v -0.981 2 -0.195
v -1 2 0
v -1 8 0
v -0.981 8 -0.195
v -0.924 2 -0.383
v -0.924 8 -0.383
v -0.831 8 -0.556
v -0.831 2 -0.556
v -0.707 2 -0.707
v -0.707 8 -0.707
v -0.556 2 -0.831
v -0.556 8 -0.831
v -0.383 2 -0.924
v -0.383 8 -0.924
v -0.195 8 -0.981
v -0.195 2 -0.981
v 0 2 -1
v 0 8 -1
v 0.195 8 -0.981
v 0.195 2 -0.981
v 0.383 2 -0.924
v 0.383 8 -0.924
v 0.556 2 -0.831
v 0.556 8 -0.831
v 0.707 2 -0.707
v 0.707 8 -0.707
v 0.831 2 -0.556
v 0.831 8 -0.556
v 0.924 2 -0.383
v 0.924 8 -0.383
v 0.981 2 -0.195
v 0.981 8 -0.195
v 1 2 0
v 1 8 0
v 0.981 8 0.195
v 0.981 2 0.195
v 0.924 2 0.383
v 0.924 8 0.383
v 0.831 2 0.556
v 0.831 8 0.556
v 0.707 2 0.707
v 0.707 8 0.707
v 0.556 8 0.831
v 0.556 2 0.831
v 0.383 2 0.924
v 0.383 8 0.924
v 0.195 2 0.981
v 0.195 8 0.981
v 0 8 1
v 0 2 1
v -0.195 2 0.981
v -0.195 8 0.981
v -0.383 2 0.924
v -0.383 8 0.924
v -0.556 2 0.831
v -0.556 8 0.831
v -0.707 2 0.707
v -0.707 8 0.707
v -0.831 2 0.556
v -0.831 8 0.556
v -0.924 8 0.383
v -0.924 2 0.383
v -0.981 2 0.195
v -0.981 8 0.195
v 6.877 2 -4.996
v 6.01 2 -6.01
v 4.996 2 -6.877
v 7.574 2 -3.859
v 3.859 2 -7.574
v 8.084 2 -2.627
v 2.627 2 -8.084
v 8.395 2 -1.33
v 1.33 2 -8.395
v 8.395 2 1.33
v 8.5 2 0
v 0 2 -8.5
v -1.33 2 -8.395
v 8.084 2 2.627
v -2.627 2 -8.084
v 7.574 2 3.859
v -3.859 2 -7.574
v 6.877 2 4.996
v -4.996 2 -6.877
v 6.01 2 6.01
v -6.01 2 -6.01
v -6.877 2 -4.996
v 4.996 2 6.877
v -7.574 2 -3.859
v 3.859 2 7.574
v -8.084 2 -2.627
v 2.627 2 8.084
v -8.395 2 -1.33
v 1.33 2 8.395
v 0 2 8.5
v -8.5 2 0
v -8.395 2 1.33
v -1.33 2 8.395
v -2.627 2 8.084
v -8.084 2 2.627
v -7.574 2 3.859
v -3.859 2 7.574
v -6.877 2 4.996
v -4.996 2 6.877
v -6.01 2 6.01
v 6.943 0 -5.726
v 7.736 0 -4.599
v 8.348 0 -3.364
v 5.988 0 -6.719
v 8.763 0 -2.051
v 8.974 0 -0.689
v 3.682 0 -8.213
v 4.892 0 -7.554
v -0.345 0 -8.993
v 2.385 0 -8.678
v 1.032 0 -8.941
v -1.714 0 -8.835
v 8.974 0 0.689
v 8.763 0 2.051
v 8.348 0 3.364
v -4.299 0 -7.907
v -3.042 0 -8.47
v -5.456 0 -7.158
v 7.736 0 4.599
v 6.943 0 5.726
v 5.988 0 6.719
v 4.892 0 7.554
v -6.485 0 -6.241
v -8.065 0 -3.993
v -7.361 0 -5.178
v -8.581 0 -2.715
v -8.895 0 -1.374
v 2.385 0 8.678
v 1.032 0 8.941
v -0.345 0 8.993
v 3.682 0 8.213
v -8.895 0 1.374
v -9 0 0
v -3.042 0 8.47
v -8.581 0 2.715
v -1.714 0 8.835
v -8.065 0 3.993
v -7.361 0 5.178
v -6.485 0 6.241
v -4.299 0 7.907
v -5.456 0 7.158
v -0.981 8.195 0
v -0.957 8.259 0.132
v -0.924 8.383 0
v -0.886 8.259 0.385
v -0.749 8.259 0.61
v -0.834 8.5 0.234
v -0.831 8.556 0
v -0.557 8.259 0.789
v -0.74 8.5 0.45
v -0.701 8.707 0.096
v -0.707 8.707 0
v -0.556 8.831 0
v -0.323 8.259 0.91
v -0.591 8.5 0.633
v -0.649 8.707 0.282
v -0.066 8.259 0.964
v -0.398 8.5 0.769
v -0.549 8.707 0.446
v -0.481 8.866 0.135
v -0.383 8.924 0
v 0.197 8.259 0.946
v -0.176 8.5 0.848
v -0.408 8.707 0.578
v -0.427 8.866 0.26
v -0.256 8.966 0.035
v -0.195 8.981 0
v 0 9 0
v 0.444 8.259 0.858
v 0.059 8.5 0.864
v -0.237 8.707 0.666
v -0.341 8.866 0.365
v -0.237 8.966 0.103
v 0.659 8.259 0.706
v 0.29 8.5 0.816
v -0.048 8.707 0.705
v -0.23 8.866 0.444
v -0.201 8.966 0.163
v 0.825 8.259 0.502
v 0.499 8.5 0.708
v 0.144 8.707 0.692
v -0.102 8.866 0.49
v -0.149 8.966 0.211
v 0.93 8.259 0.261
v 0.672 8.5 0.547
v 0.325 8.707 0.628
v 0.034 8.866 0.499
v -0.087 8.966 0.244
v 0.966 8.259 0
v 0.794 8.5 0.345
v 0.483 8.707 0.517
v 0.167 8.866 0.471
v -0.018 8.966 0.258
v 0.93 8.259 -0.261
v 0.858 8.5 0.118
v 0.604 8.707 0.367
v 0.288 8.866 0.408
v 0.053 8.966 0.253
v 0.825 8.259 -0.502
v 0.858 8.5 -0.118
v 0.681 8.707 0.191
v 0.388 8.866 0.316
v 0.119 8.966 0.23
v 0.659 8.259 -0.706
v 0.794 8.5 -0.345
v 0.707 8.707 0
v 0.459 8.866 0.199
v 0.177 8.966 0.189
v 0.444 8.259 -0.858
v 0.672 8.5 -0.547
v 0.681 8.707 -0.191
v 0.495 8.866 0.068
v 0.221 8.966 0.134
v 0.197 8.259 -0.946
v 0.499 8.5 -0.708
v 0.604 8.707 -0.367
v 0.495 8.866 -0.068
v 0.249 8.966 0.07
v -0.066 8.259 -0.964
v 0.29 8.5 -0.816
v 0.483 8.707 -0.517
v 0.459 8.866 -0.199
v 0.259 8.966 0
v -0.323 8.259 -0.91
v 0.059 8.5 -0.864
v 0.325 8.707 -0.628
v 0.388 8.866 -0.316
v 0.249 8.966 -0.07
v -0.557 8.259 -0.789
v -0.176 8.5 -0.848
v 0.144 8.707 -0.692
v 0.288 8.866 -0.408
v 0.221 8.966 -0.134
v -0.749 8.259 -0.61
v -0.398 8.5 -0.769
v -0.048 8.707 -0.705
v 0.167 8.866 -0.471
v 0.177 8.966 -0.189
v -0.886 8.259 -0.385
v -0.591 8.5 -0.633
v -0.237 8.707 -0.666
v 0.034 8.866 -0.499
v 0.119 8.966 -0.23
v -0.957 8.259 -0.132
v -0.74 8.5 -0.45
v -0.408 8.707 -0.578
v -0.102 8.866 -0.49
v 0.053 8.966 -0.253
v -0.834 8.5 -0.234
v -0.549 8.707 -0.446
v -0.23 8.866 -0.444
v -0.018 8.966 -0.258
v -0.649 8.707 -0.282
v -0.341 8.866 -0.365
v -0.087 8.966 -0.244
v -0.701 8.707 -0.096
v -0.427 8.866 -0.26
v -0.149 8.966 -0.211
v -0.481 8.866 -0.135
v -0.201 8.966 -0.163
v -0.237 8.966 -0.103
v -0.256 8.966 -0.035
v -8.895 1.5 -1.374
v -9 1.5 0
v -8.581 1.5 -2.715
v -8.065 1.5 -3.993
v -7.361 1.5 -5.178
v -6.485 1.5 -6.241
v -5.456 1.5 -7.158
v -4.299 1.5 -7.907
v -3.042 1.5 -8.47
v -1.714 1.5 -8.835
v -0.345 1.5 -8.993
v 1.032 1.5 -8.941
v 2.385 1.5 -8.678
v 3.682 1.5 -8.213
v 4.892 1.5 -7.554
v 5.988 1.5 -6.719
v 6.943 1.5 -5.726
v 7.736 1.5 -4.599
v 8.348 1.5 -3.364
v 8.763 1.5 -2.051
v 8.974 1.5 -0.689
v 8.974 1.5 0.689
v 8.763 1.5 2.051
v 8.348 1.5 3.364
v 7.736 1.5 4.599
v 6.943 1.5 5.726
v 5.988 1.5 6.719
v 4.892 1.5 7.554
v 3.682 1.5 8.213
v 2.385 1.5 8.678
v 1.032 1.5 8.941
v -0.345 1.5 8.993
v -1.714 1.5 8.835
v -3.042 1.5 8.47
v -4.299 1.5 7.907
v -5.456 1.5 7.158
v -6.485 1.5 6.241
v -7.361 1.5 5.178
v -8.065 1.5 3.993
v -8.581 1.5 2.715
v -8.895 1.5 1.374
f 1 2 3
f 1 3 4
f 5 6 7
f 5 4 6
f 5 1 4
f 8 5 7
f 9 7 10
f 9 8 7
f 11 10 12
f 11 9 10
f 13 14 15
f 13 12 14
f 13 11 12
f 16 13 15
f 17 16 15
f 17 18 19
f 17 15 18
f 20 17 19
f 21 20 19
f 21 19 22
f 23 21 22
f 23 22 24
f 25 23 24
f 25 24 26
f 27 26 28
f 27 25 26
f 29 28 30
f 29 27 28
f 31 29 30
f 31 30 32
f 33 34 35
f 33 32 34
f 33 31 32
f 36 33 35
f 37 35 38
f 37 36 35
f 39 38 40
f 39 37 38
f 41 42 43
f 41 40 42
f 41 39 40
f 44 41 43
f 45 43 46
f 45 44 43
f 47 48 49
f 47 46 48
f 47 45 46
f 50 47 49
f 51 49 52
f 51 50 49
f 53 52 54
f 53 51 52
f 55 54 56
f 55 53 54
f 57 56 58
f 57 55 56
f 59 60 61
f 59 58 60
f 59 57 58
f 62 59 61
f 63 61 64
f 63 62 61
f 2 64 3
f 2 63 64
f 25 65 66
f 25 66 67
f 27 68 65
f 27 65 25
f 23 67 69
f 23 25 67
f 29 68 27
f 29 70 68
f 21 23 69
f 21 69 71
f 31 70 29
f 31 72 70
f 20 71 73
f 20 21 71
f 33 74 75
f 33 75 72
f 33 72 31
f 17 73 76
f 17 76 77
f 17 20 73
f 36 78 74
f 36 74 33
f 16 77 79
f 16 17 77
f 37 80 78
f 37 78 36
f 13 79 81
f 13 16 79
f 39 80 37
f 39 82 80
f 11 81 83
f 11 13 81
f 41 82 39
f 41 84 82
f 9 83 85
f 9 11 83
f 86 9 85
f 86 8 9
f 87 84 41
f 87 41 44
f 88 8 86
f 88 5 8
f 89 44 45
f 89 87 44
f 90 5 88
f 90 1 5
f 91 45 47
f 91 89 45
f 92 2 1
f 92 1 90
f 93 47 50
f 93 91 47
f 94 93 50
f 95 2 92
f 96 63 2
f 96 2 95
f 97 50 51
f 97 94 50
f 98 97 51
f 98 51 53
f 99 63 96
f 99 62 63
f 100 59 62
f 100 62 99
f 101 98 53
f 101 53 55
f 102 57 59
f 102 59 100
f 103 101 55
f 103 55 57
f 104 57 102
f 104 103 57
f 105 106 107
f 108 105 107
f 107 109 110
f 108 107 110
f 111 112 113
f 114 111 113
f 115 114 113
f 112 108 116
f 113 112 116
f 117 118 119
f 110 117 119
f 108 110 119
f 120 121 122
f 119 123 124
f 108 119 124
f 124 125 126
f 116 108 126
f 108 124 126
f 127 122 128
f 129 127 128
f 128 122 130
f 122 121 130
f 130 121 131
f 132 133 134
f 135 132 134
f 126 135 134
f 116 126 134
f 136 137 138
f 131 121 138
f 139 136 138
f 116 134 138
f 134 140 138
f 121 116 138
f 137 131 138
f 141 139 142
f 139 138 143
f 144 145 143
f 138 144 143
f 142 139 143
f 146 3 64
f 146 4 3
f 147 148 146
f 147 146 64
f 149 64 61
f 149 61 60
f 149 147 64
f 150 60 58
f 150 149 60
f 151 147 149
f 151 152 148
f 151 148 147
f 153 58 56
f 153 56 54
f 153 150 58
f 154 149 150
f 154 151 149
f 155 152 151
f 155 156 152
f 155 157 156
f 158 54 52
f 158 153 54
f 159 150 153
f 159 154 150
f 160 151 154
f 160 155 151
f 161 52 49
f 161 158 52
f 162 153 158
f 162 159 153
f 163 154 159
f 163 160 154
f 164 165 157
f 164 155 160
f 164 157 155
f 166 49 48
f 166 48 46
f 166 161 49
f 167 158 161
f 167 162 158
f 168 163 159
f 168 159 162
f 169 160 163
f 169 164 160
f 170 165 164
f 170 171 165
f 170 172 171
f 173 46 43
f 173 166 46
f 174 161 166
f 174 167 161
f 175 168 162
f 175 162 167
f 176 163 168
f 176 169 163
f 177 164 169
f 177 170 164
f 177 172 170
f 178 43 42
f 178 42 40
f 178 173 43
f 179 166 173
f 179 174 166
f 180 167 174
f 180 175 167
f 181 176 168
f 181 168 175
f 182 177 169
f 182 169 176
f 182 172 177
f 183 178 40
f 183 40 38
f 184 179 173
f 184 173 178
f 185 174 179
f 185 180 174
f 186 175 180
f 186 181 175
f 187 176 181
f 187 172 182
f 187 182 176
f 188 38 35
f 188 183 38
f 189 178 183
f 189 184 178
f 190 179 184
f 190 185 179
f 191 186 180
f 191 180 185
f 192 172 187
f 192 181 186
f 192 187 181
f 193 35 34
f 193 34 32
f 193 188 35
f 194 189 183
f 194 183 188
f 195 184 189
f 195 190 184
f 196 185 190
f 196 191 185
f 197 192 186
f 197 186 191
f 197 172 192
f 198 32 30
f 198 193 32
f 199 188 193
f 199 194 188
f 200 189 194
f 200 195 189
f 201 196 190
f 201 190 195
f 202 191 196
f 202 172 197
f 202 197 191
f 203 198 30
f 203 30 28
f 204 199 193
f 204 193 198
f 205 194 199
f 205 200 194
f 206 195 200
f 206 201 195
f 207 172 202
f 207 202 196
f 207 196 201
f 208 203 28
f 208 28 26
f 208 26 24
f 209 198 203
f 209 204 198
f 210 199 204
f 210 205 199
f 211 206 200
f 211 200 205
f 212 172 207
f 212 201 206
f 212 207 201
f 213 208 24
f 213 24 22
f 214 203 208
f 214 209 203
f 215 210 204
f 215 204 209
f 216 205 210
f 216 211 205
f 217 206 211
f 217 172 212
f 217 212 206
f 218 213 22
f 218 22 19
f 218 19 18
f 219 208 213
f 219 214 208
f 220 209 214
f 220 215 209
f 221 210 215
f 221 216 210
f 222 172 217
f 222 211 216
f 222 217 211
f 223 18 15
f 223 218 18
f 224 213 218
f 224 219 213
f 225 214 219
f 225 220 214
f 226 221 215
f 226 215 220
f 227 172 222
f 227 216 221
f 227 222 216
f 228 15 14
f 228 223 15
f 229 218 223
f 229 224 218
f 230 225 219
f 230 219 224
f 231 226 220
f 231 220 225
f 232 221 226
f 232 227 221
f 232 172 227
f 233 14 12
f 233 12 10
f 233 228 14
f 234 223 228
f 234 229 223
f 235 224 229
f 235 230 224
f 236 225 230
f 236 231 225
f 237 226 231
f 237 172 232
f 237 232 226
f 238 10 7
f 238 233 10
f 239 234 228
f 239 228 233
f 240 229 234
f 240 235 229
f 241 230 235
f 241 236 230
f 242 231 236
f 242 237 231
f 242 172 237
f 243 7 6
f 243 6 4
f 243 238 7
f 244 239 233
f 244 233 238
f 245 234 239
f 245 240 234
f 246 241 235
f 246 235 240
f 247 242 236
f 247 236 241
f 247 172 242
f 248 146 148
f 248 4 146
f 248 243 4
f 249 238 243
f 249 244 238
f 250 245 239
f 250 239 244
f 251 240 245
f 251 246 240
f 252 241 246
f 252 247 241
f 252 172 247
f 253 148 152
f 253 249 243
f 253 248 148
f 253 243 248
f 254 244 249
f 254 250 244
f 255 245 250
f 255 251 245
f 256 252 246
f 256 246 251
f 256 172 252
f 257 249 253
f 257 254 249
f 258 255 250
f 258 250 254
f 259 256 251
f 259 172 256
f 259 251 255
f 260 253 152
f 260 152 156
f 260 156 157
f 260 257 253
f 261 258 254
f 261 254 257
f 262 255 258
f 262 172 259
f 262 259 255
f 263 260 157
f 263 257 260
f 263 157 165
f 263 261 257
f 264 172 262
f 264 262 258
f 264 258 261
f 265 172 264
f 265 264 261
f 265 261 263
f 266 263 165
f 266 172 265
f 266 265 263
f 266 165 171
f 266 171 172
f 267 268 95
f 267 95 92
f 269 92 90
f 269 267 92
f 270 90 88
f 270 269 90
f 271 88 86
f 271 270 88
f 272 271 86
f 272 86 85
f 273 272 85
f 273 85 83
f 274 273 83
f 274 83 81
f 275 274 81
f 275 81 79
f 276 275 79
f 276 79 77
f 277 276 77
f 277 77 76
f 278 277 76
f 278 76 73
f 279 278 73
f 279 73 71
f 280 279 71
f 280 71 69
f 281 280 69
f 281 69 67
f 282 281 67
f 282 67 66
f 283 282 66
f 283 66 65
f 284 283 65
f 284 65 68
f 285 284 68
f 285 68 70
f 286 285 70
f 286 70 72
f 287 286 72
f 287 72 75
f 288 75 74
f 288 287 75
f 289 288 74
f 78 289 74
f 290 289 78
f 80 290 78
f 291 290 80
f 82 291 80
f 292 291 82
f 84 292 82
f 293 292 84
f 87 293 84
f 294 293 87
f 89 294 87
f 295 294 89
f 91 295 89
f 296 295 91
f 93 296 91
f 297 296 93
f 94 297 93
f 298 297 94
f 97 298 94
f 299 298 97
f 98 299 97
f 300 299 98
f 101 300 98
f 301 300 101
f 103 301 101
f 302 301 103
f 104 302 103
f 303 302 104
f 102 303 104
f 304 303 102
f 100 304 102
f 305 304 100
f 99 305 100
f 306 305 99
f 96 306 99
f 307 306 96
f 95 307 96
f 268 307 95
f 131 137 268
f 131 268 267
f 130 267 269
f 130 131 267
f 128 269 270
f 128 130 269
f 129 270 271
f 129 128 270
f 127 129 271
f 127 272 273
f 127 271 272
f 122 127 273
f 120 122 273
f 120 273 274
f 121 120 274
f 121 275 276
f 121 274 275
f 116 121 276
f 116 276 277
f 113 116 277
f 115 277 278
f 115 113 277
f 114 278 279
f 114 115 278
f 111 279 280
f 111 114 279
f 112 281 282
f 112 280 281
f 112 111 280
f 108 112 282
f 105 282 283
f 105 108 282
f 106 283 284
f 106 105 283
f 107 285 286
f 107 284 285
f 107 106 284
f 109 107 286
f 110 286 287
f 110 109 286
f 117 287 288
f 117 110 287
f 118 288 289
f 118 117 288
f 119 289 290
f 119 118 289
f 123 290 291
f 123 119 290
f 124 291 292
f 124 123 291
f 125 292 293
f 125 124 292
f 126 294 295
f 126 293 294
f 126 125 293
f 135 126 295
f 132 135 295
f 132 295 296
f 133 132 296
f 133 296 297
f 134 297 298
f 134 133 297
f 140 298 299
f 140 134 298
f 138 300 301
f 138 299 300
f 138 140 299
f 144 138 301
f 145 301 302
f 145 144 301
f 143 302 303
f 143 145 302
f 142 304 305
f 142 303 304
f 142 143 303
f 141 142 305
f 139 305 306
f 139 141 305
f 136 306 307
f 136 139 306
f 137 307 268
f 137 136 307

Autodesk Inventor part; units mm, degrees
ref_plane "YZ Plane" through (0, 0, 0) normal (1, 0, 0) x (0, 1, 0)
ref_plane "XZ Plane" through (0, 0, 0) normal (0, 1, 0) x (-1, 0, 0)
ref_plane "XY Plane" through (0, 0, 0) normal (0, 0, 1) x (1, 0, 0)
sketch "Boceto1" plane through (0, 0, 0) normal (0, 1, 0) x (-1, 0, 0)
  circle A0 centre (0, 0) radius 9
  circle A1 centre (0, 0) radius 1
  dimension "d0" = 18
extrude "Extrusión1" add sketch "Boceto1" along normal blind 2
extrude "Extrusión2" add sketch "Boceto1" along normal blind 9 contours A1
chamfer "Chaflán1" distance 0.5 angle 45 1 edges at (9, 2, 0)
fillet "Empalme1" radius 1 1 edges at (1, 9, 0)
properties part number "markers_base"
